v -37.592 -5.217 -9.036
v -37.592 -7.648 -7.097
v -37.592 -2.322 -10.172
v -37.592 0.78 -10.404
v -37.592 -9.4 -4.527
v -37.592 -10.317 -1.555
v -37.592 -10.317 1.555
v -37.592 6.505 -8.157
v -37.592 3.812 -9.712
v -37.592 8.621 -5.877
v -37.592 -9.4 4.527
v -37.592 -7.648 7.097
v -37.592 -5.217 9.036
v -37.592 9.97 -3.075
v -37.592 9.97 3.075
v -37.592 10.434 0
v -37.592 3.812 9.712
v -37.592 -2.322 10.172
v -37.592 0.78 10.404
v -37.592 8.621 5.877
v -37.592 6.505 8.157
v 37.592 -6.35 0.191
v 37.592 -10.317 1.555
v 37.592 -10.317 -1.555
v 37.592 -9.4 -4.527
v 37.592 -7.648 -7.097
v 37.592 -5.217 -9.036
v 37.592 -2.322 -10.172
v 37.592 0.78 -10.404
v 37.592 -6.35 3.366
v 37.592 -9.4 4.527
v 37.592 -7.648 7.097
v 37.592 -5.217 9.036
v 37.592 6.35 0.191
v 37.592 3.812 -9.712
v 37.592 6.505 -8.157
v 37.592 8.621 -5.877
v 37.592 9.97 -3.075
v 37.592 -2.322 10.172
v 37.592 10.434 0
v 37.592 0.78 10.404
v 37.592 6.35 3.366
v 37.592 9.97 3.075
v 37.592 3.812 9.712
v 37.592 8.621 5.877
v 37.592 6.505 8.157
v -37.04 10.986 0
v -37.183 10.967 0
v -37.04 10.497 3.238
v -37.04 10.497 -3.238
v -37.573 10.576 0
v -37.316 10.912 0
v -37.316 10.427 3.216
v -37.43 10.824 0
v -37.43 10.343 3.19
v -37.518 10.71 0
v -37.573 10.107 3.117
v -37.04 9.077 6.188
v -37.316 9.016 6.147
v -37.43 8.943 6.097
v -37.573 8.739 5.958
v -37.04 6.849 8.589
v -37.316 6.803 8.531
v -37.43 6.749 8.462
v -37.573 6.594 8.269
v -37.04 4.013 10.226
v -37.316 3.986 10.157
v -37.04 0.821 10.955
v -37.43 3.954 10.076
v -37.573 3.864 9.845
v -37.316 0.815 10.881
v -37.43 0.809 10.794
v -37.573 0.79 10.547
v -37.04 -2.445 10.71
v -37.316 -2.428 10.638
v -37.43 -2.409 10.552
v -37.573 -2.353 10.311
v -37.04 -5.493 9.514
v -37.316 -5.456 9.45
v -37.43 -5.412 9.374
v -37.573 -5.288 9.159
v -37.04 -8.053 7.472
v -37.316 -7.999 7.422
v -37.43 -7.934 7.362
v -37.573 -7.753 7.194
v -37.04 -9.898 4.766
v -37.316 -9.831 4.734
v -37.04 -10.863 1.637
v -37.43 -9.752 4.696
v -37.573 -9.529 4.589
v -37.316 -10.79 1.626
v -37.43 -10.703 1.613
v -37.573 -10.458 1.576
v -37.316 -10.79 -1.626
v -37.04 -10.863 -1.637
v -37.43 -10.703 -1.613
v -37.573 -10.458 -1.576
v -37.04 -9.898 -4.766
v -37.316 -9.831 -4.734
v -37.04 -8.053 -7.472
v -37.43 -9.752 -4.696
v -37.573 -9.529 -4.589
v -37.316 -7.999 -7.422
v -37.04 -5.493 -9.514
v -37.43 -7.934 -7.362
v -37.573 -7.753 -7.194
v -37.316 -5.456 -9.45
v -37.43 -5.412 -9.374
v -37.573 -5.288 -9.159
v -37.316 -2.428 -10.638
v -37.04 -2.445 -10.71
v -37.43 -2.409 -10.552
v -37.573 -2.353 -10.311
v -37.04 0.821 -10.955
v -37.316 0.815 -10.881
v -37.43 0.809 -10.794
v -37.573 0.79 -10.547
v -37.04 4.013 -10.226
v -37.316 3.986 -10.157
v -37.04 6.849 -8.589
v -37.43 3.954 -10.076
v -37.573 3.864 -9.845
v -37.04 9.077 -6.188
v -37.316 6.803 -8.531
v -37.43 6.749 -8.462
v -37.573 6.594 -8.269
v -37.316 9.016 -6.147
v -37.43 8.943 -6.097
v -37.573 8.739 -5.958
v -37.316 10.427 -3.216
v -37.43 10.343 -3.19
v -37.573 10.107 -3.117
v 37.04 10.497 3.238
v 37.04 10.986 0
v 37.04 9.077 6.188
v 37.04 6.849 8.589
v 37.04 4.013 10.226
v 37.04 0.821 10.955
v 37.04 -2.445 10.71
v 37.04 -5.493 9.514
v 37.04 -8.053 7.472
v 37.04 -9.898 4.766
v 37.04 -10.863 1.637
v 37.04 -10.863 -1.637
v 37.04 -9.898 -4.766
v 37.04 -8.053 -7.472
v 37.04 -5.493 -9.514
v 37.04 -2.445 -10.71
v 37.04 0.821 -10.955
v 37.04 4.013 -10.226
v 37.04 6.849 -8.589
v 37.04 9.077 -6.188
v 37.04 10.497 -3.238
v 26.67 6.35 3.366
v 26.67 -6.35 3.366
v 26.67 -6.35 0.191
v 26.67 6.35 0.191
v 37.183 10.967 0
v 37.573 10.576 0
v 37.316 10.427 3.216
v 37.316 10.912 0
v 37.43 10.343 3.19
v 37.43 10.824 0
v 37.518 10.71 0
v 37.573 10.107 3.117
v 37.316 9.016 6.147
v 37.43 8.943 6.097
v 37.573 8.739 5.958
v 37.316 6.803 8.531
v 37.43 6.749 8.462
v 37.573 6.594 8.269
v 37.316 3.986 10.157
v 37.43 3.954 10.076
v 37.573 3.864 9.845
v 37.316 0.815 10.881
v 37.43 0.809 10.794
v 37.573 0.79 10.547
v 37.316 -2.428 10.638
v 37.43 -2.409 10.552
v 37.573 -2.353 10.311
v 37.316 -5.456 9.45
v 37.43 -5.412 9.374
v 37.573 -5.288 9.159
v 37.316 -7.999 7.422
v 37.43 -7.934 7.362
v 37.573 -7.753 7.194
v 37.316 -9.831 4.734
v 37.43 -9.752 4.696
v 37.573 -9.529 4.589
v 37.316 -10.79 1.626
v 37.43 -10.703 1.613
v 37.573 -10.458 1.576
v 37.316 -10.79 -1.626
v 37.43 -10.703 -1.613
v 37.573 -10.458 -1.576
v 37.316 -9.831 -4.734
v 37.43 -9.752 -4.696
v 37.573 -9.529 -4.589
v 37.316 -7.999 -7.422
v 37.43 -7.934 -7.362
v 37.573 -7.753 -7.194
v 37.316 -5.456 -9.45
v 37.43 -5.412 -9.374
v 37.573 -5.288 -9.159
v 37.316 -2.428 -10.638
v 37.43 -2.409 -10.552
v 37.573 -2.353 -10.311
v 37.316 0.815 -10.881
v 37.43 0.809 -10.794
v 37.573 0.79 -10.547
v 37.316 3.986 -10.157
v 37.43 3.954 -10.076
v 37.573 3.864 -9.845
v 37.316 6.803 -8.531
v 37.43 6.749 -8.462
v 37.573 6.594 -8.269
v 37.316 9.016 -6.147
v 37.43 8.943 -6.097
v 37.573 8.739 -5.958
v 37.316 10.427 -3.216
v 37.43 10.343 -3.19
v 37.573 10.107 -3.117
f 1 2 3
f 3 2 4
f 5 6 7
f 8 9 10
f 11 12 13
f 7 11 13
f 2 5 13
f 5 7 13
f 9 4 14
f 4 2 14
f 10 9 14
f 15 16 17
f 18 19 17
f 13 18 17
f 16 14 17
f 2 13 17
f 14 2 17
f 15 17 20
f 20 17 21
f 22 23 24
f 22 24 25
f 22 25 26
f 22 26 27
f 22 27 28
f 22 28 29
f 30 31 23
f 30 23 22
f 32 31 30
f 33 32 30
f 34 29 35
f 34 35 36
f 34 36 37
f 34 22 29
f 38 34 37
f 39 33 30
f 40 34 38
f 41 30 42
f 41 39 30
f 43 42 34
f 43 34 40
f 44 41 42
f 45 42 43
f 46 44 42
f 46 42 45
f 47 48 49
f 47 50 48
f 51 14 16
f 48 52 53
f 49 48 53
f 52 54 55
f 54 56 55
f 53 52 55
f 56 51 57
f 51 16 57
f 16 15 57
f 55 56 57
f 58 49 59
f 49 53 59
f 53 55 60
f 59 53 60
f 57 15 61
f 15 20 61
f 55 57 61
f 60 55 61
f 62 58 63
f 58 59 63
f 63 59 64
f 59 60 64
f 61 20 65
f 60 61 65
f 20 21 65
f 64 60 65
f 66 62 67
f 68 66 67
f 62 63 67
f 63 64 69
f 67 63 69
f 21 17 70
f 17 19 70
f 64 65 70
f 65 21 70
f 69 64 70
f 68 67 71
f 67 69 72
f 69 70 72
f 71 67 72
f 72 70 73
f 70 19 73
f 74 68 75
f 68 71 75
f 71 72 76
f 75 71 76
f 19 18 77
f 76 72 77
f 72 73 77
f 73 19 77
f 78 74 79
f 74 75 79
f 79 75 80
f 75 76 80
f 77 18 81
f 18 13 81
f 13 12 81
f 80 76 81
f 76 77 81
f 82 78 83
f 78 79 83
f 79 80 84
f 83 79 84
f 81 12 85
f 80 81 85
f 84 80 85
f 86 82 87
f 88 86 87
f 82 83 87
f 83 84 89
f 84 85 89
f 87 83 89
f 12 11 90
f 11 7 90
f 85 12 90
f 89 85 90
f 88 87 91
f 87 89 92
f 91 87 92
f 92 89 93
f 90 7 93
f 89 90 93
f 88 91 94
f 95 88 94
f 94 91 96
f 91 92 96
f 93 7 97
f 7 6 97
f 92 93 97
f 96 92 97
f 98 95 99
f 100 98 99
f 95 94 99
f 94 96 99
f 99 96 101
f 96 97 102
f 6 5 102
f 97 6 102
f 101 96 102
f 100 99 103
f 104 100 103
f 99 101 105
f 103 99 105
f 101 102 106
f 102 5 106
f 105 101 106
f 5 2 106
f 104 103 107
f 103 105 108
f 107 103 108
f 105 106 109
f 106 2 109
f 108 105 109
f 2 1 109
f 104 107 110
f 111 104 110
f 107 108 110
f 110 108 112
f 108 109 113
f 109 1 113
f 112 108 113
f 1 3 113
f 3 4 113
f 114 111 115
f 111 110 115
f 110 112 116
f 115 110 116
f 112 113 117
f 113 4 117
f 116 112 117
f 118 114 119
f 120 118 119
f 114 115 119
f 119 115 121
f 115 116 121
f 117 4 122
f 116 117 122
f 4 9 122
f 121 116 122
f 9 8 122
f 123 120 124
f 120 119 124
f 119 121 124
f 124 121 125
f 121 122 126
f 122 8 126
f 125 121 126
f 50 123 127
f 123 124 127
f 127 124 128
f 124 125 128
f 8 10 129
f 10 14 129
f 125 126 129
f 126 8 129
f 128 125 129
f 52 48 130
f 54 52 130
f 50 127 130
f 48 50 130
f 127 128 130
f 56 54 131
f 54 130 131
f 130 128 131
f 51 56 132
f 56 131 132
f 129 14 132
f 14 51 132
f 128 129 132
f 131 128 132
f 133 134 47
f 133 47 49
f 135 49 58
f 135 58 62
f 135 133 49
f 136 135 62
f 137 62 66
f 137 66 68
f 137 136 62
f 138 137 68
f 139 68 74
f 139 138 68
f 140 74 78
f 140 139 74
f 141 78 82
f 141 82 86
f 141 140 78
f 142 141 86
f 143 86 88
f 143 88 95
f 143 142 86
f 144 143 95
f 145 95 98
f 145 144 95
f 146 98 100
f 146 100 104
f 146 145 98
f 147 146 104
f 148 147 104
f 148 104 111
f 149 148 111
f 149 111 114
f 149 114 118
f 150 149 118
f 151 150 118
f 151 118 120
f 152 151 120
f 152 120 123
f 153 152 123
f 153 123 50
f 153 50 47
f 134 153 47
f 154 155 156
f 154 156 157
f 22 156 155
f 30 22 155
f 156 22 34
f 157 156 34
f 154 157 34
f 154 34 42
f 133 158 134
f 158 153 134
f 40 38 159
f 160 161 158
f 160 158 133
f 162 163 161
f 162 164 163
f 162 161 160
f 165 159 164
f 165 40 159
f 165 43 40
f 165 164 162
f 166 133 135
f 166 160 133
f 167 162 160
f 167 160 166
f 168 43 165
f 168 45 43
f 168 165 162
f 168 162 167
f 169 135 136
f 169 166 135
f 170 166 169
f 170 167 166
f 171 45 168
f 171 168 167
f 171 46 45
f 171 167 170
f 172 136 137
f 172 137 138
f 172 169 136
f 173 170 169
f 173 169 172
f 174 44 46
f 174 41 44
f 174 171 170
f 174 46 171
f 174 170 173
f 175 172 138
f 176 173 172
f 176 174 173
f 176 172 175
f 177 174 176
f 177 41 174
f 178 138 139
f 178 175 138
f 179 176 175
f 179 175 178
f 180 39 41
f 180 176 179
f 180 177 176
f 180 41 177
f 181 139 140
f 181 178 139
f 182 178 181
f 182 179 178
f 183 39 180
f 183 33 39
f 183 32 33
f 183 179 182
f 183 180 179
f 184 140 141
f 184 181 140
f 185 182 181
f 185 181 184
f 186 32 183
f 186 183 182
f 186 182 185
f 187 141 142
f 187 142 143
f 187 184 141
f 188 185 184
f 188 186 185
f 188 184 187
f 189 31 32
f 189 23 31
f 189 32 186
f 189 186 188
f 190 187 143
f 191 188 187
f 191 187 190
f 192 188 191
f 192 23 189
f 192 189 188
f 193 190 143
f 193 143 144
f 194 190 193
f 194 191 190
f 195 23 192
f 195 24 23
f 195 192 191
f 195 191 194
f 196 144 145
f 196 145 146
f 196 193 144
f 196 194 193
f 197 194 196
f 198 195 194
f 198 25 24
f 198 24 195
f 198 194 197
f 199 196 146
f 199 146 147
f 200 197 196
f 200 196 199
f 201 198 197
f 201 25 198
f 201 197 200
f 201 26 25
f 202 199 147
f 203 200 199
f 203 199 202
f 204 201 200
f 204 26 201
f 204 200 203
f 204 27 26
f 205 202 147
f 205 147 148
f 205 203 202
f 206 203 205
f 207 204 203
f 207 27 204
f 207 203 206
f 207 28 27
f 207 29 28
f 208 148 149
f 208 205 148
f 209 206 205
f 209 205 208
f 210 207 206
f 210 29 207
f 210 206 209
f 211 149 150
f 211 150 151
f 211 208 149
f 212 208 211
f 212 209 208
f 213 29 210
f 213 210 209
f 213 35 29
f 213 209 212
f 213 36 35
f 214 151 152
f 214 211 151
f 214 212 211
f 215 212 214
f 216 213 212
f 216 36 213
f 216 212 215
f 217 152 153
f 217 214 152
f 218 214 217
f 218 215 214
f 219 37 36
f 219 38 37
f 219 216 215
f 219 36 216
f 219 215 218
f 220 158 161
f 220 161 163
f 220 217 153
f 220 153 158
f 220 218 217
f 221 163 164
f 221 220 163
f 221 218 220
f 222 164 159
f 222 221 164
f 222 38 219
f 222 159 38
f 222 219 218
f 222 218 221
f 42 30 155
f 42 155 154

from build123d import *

# Parameters (mm, degrees)
F0_R     = 10.9855
F1_DEPTH = 37.592
F2_W     = 12.7
F2_H     = 3.175
F3_DEPTH = 10.922
F4_R     = 0.5518892204


with BuildPart() as f1:
    # F0 (on Right) → F1 (new body, symmetric)
    with BuildSketch(Plane.YZ):
        Circle(F0_R)
    extrude(amount=F1_DEPTH, both=True)

    # F2 (on face) → F3 (cut)
    with BuildSketch(Plane.YZ.offset(37.592)):
        with Locations((0, 1.778)):
            Rectangle(F2_W, F2_H)
    extrude(amount=-F3_DEPTH, mode=Mode.SUBTRACT)

    # F4
    f4_edges = [f1.edges().sort_by_distance(p)[0] for p in [
        (37.592, -10.9855, 0),
        (-37.592, -10.9855, 0),
    ]]
    fillet(f4_edges, radius=F4_R)


solid = f1.part
